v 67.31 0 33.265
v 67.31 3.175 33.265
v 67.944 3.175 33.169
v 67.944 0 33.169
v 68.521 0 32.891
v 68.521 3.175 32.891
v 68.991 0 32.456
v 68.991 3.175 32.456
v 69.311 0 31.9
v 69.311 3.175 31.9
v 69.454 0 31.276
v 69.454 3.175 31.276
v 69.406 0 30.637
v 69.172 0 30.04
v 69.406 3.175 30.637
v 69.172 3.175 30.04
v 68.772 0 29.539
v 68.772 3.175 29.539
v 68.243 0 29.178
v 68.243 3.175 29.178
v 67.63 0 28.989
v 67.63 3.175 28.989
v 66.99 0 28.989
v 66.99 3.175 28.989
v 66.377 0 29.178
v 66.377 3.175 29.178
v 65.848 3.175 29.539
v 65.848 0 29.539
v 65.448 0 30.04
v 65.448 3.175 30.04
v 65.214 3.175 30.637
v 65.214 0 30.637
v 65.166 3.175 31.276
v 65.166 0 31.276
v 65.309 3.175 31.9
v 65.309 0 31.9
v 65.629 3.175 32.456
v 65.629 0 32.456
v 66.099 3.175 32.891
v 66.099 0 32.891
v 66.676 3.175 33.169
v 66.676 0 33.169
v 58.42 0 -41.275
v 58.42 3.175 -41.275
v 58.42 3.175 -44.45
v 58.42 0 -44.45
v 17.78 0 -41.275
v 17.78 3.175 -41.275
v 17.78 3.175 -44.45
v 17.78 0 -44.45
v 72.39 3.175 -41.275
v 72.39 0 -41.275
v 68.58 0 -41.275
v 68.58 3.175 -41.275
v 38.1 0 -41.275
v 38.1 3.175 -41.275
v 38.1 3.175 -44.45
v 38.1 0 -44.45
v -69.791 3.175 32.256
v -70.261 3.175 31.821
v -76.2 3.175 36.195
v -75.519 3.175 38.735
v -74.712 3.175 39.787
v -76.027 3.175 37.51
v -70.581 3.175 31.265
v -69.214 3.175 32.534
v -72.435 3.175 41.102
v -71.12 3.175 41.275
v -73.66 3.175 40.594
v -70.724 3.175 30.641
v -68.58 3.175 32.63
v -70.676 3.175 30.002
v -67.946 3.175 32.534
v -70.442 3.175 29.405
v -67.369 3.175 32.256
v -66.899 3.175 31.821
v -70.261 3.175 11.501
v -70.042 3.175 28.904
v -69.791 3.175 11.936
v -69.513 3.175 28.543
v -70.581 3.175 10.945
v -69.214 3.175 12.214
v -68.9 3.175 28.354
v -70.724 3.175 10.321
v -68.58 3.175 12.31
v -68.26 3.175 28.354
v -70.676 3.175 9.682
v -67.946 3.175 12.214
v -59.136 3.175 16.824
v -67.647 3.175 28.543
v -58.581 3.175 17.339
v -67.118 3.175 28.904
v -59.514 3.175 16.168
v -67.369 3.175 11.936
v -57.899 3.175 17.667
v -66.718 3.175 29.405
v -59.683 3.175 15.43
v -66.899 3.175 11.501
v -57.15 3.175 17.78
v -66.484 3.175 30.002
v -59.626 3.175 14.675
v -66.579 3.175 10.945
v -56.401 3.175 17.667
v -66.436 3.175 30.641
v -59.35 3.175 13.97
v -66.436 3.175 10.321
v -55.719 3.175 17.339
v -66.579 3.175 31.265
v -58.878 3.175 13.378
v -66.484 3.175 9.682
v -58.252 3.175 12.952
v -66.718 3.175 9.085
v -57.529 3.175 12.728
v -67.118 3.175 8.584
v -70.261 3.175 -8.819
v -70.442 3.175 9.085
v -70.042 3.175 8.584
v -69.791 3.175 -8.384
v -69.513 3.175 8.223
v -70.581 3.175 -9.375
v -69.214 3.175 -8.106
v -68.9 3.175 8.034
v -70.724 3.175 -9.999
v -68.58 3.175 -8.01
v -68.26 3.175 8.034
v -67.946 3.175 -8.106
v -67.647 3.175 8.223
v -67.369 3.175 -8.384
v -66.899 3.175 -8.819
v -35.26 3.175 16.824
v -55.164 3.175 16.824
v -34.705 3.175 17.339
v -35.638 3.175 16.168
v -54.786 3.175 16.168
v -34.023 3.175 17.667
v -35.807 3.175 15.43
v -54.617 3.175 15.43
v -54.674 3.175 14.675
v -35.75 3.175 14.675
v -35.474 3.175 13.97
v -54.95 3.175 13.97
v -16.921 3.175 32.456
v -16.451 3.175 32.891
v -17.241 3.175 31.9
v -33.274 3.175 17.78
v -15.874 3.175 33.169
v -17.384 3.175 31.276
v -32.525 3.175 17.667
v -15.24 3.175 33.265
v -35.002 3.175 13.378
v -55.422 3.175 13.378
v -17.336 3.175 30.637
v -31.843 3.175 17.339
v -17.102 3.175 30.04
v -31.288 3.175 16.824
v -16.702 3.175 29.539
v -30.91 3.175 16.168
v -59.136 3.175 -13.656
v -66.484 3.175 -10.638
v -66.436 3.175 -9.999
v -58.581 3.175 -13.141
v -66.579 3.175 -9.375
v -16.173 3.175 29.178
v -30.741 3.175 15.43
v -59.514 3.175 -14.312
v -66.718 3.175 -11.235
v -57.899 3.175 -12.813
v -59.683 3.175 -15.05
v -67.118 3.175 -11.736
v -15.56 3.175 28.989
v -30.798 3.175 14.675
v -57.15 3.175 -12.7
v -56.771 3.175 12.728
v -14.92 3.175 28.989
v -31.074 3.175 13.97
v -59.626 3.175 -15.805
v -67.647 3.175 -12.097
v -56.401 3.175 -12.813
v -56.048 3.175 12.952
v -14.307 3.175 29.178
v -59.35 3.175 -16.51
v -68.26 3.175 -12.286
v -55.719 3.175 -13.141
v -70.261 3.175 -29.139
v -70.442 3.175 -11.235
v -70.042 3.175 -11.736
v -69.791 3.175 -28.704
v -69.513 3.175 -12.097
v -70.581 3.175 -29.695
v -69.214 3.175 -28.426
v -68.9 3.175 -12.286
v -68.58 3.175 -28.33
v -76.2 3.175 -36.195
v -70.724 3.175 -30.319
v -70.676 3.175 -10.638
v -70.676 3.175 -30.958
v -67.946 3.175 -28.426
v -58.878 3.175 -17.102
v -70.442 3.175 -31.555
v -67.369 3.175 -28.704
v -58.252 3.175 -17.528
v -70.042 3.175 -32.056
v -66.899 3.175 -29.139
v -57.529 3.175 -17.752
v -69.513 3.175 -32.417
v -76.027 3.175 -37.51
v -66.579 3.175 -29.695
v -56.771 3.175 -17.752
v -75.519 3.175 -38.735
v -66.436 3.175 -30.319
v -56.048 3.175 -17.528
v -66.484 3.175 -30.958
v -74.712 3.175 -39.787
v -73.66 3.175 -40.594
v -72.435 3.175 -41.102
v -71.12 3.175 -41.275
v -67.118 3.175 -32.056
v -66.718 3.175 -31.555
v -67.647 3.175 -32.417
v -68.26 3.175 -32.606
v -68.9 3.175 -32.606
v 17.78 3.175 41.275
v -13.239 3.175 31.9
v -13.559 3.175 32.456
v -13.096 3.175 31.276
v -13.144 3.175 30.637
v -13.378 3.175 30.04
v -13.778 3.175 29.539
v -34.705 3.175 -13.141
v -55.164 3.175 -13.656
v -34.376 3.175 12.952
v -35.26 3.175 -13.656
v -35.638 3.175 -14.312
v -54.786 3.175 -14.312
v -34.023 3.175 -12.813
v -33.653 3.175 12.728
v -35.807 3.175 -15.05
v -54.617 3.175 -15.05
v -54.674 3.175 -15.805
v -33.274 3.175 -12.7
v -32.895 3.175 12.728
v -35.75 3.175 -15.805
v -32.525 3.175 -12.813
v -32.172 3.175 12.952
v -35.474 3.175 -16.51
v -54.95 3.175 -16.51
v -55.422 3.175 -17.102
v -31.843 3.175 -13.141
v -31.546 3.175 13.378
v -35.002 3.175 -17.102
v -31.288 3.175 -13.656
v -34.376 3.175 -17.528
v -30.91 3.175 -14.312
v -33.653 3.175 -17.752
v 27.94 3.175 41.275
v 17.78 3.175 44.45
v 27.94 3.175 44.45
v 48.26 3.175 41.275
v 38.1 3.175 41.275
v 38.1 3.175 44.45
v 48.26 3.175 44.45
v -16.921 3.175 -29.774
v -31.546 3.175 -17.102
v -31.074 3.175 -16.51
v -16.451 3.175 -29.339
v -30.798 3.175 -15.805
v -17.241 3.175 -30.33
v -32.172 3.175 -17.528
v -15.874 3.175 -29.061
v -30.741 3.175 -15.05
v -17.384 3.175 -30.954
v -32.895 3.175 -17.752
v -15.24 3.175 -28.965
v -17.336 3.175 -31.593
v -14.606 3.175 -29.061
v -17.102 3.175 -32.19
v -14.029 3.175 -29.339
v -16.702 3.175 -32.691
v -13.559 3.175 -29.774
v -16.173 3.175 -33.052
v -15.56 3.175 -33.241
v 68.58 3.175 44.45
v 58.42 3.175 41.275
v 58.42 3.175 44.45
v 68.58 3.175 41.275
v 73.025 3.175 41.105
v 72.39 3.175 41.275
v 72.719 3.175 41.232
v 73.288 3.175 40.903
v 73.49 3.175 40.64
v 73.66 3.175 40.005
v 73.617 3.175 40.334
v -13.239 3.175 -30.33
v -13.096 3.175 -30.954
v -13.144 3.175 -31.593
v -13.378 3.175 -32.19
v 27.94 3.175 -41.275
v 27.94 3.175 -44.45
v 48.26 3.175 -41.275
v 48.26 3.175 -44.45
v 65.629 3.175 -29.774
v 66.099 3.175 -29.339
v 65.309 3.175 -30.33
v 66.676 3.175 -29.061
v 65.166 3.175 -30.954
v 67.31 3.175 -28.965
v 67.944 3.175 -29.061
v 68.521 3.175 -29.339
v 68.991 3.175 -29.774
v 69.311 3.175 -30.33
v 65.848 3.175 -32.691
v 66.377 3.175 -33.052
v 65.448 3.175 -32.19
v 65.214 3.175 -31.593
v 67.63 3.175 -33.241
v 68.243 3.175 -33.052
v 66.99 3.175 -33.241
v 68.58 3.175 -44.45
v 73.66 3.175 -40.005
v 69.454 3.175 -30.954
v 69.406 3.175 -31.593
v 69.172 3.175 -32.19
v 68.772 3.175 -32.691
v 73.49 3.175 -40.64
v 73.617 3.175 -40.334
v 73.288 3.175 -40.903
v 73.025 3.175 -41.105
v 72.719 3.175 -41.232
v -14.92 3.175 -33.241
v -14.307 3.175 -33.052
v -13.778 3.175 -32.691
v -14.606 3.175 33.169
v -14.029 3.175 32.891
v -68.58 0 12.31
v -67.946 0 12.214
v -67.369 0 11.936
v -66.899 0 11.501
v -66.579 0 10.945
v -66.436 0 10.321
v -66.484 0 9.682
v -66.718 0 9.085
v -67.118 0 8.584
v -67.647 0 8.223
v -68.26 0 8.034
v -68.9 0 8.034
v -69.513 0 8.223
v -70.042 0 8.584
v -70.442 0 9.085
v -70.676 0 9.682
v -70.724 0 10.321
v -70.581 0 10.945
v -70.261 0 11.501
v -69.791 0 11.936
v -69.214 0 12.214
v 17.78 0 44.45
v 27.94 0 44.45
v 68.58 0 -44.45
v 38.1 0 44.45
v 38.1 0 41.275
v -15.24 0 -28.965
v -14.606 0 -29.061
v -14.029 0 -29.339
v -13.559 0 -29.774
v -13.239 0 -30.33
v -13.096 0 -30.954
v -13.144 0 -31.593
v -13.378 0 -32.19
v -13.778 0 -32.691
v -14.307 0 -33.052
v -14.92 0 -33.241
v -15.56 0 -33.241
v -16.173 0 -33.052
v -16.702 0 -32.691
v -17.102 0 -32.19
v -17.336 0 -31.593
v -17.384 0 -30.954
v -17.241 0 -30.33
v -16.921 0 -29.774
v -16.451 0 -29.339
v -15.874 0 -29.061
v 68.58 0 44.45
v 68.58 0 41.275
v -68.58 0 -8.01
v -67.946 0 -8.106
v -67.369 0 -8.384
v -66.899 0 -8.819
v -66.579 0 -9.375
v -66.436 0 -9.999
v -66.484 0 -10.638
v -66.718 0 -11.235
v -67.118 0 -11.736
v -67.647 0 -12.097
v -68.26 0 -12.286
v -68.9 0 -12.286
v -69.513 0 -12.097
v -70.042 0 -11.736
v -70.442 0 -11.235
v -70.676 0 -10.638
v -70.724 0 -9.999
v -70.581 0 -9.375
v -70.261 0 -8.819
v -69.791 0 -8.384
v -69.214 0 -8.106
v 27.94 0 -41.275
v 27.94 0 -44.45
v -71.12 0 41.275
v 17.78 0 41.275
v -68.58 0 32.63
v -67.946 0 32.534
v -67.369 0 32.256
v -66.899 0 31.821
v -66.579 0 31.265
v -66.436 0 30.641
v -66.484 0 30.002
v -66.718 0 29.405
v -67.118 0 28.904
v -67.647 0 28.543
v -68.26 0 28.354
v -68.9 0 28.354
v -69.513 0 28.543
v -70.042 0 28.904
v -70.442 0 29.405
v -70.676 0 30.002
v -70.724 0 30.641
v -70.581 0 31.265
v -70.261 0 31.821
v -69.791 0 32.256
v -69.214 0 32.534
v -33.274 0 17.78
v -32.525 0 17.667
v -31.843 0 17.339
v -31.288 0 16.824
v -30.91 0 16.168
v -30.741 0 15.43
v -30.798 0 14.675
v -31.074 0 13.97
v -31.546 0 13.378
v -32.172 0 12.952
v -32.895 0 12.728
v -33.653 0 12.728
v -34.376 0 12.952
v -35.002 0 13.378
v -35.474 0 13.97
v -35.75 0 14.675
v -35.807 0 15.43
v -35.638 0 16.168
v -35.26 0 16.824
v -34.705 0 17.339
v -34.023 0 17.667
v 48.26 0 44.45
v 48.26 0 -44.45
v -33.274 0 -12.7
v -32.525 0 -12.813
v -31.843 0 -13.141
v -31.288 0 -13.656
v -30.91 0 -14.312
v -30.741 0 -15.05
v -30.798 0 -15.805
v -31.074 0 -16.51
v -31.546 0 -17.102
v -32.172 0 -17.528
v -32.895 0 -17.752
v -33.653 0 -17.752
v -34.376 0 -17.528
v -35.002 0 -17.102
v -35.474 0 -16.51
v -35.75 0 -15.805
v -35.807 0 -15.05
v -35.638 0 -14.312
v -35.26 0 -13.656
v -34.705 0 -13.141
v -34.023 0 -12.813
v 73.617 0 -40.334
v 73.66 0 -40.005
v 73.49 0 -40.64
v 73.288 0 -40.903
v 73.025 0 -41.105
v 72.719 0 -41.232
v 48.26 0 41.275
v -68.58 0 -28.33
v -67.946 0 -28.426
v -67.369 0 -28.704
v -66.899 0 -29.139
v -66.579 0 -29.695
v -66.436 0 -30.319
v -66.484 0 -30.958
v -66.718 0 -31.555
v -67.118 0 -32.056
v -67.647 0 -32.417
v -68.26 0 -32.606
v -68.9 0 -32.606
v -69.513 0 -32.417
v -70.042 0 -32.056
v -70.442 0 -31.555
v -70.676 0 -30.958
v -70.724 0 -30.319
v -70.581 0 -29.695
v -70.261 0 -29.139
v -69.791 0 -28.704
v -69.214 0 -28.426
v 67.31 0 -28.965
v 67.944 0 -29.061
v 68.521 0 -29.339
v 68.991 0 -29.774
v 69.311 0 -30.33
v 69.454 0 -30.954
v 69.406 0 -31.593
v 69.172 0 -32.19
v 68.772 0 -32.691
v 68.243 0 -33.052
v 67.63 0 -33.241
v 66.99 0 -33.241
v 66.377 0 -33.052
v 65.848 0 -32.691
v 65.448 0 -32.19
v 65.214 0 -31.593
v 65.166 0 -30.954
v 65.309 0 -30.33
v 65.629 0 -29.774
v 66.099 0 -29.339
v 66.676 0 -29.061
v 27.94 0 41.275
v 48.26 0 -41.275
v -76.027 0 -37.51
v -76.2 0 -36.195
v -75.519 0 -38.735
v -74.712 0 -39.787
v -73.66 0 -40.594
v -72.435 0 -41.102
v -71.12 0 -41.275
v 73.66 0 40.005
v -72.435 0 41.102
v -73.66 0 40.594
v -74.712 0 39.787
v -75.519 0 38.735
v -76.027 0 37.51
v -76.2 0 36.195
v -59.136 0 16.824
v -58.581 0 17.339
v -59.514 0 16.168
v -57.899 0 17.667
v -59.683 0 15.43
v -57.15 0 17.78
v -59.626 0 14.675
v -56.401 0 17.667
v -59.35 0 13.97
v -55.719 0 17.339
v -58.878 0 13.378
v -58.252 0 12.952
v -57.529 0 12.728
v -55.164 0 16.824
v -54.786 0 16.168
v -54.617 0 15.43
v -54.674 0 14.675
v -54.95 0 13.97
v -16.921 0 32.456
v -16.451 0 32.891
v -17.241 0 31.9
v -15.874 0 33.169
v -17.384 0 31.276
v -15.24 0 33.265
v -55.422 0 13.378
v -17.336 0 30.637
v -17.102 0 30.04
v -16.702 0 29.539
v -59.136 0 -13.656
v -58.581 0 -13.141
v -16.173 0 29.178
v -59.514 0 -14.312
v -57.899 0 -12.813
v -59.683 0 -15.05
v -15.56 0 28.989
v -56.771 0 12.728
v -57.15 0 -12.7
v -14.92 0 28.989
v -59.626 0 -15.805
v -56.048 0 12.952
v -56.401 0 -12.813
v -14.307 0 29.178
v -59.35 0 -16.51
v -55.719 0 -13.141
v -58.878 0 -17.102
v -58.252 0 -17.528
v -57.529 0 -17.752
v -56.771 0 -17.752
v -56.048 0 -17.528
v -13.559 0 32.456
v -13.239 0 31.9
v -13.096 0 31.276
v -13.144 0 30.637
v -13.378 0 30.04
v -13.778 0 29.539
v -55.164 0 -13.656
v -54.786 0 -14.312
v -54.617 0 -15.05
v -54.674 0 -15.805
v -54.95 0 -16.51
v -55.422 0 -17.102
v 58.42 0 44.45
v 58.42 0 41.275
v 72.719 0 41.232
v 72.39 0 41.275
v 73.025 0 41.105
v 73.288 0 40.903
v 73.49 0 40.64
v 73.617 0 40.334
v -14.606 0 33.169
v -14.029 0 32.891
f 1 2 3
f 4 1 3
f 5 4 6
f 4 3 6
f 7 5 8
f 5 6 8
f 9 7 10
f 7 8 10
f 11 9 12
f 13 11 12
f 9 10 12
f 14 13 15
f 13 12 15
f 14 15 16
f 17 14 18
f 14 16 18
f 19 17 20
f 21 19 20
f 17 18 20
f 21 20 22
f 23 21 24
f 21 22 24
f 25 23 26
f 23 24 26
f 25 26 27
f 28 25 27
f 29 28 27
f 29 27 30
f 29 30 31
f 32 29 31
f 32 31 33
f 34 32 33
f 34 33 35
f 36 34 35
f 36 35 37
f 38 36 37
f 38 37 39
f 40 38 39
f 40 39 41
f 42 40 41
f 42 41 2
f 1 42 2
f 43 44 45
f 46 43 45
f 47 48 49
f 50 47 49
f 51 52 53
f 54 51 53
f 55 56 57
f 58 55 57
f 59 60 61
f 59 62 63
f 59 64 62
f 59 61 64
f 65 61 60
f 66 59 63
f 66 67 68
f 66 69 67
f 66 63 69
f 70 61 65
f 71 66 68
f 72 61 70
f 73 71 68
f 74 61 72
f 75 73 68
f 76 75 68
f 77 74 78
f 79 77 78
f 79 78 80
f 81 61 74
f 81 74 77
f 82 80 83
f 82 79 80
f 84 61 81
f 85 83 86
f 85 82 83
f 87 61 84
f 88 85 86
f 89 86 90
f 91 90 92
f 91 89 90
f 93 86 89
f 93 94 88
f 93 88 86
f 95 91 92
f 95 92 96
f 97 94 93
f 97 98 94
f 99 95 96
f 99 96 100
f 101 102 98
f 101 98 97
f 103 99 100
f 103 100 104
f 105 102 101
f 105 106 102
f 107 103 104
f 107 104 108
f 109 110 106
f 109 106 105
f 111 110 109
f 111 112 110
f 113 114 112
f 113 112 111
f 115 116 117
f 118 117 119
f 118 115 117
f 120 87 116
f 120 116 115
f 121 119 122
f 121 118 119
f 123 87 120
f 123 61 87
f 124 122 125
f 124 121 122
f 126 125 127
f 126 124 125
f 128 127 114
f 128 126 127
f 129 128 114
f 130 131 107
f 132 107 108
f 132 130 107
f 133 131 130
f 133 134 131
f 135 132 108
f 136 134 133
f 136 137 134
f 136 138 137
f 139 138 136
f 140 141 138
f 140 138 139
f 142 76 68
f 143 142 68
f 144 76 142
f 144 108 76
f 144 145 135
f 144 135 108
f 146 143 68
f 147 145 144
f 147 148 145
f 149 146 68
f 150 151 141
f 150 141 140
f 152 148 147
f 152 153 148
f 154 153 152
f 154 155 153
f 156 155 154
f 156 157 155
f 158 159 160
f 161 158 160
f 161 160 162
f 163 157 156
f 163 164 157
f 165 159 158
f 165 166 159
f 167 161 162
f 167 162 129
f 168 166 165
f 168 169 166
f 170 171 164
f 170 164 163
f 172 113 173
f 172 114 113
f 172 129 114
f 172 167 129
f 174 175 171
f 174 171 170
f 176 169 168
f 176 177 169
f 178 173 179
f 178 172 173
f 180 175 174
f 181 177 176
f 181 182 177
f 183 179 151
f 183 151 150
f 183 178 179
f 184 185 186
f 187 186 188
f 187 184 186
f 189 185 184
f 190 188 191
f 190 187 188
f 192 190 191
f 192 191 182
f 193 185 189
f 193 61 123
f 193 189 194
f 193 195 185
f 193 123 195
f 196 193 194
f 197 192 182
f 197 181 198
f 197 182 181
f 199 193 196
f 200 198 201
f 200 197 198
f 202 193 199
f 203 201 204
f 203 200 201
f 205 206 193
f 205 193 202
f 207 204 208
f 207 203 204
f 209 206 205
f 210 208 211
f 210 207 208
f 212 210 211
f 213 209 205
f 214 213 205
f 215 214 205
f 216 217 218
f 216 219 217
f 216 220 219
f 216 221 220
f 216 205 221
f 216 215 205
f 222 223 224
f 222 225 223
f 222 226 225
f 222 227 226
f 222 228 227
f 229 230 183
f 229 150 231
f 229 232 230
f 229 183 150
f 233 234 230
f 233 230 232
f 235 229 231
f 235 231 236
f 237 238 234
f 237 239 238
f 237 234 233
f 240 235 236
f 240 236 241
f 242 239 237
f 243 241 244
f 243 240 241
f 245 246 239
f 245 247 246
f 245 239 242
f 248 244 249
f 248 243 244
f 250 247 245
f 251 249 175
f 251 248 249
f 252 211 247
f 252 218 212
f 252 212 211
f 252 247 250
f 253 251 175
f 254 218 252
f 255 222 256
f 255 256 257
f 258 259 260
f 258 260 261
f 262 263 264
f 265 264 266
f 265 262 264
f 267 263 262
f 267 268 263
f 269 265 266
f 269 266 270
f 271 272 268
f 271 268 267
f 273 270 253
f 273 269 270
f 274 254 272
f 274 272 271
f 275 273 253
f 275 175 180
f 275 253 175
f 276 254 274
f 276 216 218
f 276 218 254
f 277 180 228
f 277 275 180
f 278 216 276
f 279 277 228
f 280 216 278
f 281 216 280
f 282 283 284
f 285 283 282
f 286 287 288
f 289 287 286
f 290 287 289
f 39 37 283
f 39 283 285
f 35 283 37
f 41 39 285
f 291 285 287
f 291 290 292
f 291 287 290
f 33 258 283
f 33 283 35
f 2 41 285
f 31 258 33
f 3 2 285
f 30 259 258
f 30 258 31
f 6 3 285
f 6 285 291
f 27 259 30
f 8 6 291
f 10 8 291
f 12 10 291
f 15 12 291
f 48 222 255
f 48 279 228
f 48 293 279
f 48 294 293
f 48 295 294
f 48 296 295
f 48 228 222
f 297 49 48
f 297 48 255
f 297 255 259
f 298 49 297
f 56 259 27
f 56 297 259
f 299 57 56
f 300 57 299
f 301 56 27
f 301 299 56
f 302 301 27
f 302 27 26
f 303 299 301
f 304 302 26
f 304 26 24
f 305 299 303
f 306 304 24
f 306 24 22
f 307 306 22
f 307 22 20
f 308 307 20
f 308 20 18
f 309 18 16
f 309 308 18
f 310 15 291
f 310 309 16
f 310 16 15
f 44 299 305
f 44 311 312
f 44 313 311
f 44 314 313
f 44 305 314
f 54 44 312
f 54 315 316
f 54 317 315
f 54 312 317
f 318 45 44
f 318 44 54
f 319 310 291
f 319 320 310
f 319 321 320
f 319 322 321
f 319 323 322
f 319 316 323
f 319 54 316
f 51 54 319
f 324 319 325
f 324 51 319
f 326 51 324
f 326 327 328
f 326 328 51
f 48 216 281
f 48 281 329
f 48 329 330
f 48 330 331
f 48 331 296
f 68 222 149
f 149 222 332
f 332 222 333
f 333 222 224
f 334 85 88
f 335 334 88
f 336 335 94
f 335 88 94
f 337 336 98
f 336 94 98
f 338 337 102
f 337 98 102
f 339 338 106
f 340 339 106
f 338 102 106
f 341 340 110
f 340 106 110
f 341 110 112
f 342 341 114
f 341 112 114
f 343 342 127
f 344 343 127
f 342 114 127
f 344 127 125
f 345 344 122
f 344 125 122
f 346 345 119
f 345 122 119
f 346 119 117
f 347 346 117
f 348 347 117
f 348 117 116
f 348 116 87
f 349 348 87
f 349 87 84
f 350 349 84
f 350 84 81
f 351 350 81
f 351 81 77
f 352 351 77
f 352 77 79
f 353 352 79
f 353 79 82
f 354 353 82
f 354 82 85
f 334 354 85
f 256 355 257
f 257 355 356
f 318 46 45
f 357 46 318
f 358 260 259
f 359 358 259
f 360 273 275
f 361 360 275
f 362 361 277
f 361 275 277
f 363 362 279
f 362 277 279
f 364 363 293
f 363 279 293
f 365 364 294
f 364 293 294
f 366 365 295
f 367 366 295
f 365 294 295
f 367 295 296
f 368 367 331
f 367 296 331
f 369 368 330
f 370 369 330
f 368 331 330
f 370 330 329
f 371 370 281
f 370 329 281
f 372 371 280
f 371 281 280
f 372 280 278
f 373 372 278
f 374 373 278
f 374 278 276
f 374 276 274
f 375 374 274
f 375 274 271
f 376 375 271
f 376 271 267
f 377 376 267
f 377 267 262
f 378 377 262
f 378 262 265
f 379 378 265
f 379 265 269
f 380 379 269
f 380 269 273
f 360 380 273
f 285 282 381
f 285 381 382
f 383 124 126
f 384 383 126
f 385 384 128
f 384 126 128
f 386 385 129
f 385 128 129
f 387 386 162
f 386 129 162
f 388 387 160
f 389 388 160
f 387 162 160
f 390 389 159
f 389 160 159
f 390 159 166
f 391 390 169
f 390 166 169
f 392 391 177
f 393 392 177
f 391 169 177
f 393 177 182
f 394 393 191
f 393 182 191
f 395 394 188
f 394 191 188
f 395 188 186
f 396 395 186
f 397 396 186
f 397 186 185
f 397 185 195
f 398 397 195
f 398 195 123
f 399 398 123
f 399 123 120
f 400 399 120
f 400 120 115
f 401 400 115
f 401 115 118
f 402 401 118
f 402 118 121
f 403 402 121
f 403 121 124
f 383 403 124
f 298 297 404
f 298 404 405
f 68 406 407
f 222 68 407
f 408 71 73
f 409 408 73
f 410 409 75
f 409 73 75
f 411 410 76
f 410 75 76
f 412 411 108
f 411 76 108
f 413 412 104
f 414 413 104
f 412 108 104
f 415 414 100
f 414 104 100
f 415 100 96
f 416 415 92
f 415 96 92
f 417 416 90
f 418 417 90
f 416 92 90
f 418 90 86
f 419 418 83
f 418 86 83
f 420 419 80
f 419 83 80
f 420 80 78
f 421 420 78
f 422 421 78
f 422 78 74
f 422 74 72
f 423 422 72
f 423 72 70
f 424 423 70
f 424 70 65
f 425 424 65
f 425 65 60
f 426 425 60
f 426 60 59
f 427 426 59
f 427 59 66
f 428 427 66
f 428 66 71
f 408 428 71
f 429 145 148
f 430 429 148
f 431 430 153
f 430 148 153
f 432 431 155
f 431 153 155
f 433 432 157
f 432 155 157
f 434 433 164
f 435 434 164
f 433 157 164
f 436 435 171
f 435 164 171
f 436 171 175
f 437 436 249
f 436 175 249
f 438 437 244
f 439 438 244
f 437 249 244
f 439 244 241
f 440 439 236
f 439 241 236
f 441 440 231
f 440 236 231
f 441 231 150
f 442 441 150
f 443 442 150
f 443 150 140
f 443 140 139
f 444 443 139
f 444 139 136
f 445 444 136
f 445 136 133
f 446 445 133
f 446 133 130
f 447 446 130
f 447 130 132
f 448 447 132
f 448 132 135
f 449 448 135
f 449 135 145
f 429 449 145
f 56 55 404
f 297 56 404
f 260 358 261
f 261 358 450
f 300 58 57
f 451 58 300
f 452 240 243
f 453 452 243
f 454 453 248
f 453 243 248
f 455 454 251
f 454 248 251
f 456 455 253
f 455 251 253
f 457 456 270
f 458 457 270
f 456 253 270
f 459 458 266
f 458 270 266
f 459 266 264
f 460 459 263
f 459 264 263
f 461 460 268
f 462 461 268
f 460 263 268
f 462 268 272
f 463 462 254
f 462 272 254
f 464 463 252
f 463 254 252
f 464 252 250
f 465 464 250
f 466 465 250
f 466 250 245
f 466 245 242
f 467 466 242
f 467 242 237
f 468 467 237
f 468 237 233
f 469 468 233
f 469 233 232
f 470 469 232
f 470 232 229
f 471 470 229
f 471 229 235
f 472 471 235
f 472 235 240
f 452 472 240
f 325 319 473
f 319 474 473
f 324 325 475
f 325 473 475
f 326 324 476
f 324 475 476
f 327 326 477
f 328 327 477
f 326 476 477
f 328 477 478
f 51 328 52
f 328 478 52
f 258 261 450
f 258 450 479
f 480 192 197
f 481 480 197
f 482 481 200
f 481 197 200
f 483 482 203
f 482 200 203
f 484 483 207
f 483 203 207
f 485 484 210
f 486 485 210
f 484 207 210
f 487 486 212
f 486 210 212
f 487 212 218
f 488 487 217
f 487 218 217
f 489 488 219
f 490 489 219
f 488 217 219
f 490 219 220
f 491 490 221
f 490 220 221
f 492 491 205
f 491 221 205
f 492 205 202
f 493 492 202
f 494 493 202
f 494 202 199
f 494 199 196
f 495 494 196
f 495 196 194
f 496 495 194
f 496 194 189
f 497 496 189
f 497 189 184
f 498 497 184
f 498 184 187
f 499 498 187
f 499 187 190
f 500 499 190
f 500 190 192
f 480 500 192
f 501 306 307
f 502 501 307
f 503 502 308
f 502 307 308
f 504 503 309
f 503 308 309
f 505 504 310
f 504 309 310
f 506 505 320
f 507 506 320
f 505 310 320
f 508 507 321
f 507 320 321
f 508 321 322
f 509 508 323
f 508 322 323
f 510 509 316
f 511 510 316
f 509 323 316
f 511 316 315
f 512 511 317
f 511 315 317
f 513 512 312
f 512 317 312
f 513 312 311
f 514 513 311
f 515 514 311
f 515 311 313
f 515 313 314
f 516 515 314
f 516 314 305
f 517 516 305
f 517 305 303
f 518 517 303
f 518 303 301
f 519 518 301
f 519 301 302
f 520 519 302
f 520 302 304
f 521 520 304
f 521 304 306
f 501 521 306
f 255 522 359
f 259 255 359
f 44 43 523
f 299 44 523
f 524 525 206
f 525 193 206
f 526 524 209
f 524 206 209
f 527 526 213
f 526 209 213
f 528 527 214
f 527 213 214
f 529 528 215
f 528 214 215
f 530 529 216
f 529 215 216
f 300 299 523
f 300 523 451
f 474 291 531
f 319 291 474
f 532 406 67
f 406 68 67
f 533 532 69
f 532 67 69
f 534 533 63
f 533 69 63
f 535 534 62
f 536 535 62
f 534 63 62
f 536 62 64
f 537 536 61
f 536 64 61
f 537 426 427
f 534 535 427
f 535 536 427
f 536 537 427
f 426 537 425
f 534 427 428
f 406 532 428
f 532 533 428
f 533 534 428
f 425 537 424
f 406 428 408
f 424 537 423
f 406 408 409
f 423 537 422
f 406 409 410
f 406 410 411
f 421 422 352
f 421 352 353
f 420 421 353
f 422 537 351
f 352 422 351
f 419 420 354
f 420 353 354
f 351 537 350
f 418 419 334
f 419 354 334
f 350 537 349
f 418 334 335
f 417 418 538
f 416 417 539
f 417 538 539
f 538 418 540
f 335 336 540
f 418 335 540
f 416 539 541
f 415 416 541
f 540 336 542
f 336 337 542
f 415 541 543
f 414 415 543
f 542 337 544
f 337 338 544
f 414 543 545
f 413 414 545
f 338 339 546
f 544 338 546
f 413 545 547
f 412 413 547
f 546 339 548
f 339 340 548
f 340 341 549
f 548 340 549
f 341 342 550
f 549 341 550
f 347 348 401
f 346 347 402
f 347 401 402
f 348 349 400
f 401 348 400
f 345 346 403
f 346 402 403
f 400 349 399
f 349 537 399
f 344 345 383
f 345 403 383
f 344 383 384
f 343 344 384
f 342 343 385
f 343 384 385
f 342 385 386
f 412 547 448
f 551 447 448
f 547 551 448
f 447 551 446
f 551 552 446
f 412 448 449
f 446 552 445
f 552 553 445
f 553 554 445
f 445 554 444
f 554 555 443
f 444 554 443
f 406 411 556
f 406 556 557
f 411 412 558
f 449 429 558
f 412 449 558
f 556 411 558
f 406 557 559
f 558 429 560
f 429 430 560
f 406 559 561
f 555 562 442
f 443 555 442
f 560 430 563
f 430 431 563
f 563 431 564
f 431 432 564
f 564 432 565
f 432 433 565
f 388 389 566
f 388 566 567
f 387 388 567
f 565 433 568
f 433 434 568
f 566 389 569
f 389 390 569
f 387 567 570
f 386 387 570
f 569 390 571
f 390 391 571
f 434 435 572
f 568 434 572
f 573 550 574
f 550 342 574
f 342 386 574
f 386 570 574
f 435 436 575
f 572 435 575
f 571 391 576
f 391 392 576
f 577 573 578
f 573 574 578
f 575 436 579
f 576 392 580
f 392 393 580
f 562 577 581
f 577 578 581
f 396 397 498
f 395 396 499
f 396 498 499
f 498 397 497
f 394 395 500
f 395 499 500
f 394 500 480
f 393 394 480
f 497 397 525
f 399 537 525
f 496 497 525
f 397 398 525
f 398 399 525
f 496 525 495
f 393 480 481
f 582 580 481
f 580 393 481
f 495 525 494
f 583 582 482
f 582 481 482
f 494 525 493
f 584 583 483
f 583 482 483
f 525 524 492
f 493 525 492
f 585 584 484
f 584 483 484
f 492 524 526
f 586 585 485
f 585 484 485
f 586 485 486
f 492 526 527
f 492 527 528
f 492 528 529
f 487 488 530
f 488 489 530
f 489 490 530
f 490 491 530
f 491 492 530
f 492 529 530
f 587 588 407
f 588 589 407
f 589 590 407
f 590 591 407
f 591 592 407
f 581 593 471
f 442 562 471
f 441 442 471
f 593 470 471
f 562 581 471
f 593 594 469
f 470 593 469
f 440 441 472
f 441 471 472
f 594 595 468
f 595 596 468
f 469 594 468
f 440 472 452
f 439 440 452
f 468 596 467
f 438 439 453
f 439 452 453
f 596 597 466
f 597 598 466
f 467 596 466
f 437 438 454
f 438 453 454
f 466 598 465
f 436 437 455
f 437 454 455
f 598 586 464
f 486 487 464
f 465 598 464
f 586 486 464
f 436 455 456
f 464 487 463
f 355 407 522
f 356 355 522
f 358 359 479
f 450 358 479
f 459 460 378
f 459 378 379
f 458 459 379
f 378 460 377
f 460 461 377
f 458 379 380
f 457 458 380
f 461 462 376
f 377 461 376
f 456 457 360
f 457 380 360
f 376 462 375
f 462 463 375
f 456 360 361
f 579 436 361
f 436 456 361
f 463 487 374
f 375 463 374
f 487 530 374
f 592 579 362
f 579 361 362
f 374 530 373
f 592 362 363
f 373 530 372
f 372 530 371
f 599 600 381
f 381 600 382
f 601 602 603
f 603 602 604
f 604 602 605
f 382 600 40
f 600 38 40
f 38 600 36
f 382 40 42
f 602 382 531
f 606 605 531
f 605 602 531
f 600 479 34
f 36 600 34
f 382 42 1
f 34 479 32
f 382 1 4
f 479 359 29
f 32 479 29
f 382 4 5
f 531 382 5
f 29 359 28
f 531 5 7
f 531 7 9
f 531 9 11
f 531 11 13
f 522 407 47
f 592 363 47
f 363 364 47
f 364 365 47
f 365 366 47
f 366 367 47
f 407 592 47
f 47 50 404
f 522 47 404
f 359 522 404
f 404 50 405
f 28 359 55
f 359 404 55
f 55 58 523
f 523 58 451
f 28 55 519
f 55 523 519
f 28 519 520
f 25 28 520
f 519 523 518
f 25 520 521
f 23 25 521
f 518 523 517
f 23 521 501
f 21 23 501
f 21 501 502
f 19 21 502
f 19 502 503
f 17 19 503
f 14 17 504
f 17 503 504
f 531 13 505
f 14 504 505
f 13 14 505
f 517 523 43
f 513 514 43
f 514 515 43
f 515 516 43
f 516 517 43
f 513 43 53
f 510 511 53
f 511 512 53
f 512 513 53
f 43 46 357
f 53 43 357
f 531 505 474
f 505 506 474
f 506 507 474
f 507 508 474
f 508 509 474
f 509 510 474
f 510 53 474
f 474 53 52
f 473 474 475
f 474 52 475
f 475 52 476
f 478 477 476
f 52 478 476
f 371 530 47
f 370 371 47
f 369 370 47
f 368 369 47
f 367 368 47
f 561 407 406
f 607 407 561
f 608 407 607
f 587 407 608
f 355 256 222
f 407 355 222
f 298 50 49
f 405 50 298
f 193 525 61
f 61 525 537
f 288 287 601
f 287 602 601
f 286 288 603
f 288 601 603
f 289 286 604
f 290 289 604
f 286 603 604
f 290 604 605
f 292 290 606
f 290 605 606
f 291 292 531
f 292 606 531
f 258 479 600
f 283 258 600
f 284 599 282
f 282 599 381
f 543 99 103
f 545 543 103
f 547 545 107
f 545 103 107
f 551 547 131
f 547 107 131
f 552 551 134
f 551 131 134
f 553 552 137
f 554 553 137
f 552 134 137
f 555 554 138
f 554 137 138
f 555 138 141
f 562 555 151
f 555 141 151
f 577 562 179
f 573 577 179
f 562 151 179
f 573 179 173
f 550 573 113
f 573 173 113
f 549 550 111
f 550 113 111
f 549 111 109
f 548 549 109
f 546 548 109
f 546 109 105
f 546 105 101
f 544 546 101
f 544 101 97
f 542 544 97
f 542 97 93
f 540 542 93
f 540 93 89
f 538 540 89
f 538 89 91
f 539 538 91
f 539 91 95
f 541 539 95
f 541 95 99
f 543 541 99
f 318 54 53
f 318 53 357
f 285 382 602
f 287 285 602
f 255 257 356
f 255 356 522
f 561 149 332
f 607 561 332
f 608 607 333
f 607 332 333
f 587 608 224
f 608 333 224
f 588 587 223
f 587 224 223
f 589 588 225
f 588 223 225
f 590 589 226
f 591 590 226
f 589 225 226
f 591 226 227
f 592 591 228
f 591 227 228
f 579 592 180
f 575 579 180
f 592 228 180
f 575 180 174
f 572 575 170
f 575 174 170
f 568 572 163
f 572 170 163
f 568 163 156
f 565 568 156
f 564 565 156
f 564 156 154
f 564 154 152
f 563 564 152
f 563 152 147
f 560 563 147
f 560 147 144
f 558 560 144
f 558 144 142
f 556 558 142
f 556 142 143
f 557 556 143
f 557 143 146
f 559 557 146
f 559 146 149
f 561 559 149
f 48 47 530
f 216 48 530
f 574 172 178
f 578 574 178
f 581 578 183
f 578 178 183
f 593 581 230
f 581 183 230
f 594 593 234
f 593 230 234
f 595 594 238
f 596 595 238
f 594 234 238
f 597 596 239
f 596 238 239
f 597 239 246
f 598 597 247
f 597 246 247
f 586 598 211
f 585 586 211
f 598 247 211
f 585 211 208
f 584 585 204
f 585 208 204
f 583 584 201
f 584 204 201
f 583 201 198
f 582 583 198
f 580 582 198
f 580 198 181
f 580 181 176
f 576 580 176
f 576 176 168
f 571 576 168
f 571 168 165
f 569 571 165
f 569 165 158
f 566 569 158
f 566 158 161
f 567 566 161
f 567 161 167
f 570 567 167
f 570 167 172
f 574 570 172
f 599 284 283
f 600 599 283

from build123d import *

# Parameters (mm, degrees)
SKETCH1_W                     = 10.16
SKETCH1_H                     = 3.175
MAIN_EXTRUDE_DEPTH            = 3.175
SKETCH2_R                     = 2.54
CASTER_MOUNTING_HOLES_DEPTH   = 89.274136218
SKETCH3_W                     = 2.54
SKETCH3_H                     = 82.55
REMOVE_UNEVEN_BACK_EDGE_DEPTH = 89.274136218
SKETCH5_R                     = 2.15
STANDOFF_HOLES_DEPTH          = 89.274136218
FILLET1_R                     = 5.08
FILLET2_R                     = 1.27
FILLET3_R                     = 1.27
SKETCH9_R                     = 2.15
FRONT_MOUNTING_HOLES_DEPTH    = 89.274136218


with BuildPart() as part:
    # Sketch1 → Main Extrude (new body)
    with BuildSketch(Plane(origin=(0, 0, 0), x_dir=(1, 0, 0), z_dir=(0, 1, 0))):
        with Locations((22.86, -42.8625)):
            Rectangle(SKETCH1_W, SKETCH1_H)
        Polygon((27.94, -41.275), (38.1, -41.275), (48.26, -41.275), (58.42, -41.275), (68.58, -41.275), (76.2, -41.275), (76.2, 41.275), (68.58, 41.275), (58.42, 41.275), (48.26, 41.275), (38.1, 41.275), (27.94, 41.275), (17.78, 41.275), (-76.2, 41.275), (-76.2, -41.275), (17.78, -41.275), align=None)
        with Locations((43.18, -42.8625)):
            Rectangle(SKETCH1_W, SKETCH1_H)
        with Locations((22.86, 42.8625)):
            Rectangle(SKETCH1_W, SKETCH1_H)
        with Locations((63.5, -42.8625)):
            Rectangle(SKETCH1_W, SKETCH1_H)
        with Locations((63.5, 42.8625)):
            Rectangle(SKETCH1_W, SKETCH1_H)
        with Locations((43.18, 42.8625)):
            Rectangle(SKETCH1_W, SKETCH1_H)
    extrude(amount=MAIN_EXTRUDE_DEPTH)

    # Sketch2 → Caster Mounting Holes (cut, through all)
    with BuildSketch(Plane(origin=(0, 3.175, 0), x_dir=(1, 0, 0), z_dir=(0, 1, 0))):
        with Locations(Location((-57.15, 15.24, 0), (0, 0, 270))):
            Circle(SKETCH2_R)
        with Locations(Location((-33.274, 15.24, 0), (0, 0, 270))):
            Circle(SKETCH2_R)
        with Locations(Location((-33.274, -15.24, 0), (0, 0, 270))):
            Circle(SKETCH2_R)
        with Locations(Location((-57.15, -15.24, 0), (0, 0, 270))):
            Circle(SKETCH2_R)
    extrude(amount=-CASTER_MOUNTING_HOLES_DEPTH, mode=Mode.SUBTRACT)

    # Sketch3 → Remove Uneven Back Edge (cut, through all)
    with BuildSketch(Plane(origin=(0, 3.175, 0), x_dir=(1, 0, 0), z_dir=(0, 1, 0))):
        with Locations((74.93, 0)):
            Rectangle(SKETCH3_W, SKETCH3_H)
    extrude(amount=-REMOVE_UNEVEN_BACK_EDGE_DEPTH, mode=Mode.SUBTRACT)

    # Sketch5 → Standoff Holes (cut, through all)
    with BuildSketch(Plane(origin=(0, 3.175, 0), x_dir=(1, 0, 0), z_dir=(0, 1, 0))):
        with Locations(Location((-15.24, 31.115, 0), (0, 0, 270))):
            Circle(SKETCH5_R)
        with Locations(Location((67.31, 31.115, 0), (0, 0, 270))):
            Circle(SKETCH5_R)
        with Locations(Location((67.31, -31.115, 0), (0, 0, 270))):
            Circle(SKETCH5_R)
        with Locations(Location((-15.24, -31.115, 0), (0, 0, 270))):
            Circle(SKETCH5_R)
    extrude(amount=-STANDOFF_HOLES_DEPTH, mode=Mode.SUBTRACT)

    # Fillet1
    fillet1_edges = [part.edges().sort_by_distance(p)[0] for p in [
        (-76.2, 1.5875, 41.275),
        (-76.2, 1.5875, -41.275),
    ]]
    fillet(fillet1_edges, radius=FILLET1_R)

    # Fillet2
    fillet2_edges = [part.edges().sort_by_distance(p)[0] for p in [
        (73.66, 1.5875, 41.275),
    ]]
    fillet(fillet2_edges, radius=FILLET2_R)

    # Fillet3
    fillet3_edges = [part.edges().sort_by_distance(p)[0] for p in [
        (73.66, 1.5875, -41.275),
    ]]
    fillet(fillet3_edges, radius=FILLET3_R)

    # Sketch9 → Front Mounting Holes (cut, through all)
    with BuildSketch(Plane(origin=(0, 3.175, 0), x_dir=(1, 0, 0), z_dir=(0, 1, 0))):
        with Locations(Location((-68.58, -30.48, 0), (0, 0, 270))):
            Circle(SKETCH9_R)
        with Locations(Location((-68.58, -10.16, 0), (0, 0, 270))):
            Circle(SKETCH9_R)
        with Locations(Location((-68.58, 10.16, 0), (0, 0, 270))):
            Circle(SKETCH9_R)
        with Locations(Location((-68.58, 30.48, 0), (0, 0, 270))):
            Circle(SKETCH9_R)
    extrude(amount=-FRONT_MOUNTING_HOLES_DEPTH, mode=Mode.SUBTRACT)


solid = part.part
